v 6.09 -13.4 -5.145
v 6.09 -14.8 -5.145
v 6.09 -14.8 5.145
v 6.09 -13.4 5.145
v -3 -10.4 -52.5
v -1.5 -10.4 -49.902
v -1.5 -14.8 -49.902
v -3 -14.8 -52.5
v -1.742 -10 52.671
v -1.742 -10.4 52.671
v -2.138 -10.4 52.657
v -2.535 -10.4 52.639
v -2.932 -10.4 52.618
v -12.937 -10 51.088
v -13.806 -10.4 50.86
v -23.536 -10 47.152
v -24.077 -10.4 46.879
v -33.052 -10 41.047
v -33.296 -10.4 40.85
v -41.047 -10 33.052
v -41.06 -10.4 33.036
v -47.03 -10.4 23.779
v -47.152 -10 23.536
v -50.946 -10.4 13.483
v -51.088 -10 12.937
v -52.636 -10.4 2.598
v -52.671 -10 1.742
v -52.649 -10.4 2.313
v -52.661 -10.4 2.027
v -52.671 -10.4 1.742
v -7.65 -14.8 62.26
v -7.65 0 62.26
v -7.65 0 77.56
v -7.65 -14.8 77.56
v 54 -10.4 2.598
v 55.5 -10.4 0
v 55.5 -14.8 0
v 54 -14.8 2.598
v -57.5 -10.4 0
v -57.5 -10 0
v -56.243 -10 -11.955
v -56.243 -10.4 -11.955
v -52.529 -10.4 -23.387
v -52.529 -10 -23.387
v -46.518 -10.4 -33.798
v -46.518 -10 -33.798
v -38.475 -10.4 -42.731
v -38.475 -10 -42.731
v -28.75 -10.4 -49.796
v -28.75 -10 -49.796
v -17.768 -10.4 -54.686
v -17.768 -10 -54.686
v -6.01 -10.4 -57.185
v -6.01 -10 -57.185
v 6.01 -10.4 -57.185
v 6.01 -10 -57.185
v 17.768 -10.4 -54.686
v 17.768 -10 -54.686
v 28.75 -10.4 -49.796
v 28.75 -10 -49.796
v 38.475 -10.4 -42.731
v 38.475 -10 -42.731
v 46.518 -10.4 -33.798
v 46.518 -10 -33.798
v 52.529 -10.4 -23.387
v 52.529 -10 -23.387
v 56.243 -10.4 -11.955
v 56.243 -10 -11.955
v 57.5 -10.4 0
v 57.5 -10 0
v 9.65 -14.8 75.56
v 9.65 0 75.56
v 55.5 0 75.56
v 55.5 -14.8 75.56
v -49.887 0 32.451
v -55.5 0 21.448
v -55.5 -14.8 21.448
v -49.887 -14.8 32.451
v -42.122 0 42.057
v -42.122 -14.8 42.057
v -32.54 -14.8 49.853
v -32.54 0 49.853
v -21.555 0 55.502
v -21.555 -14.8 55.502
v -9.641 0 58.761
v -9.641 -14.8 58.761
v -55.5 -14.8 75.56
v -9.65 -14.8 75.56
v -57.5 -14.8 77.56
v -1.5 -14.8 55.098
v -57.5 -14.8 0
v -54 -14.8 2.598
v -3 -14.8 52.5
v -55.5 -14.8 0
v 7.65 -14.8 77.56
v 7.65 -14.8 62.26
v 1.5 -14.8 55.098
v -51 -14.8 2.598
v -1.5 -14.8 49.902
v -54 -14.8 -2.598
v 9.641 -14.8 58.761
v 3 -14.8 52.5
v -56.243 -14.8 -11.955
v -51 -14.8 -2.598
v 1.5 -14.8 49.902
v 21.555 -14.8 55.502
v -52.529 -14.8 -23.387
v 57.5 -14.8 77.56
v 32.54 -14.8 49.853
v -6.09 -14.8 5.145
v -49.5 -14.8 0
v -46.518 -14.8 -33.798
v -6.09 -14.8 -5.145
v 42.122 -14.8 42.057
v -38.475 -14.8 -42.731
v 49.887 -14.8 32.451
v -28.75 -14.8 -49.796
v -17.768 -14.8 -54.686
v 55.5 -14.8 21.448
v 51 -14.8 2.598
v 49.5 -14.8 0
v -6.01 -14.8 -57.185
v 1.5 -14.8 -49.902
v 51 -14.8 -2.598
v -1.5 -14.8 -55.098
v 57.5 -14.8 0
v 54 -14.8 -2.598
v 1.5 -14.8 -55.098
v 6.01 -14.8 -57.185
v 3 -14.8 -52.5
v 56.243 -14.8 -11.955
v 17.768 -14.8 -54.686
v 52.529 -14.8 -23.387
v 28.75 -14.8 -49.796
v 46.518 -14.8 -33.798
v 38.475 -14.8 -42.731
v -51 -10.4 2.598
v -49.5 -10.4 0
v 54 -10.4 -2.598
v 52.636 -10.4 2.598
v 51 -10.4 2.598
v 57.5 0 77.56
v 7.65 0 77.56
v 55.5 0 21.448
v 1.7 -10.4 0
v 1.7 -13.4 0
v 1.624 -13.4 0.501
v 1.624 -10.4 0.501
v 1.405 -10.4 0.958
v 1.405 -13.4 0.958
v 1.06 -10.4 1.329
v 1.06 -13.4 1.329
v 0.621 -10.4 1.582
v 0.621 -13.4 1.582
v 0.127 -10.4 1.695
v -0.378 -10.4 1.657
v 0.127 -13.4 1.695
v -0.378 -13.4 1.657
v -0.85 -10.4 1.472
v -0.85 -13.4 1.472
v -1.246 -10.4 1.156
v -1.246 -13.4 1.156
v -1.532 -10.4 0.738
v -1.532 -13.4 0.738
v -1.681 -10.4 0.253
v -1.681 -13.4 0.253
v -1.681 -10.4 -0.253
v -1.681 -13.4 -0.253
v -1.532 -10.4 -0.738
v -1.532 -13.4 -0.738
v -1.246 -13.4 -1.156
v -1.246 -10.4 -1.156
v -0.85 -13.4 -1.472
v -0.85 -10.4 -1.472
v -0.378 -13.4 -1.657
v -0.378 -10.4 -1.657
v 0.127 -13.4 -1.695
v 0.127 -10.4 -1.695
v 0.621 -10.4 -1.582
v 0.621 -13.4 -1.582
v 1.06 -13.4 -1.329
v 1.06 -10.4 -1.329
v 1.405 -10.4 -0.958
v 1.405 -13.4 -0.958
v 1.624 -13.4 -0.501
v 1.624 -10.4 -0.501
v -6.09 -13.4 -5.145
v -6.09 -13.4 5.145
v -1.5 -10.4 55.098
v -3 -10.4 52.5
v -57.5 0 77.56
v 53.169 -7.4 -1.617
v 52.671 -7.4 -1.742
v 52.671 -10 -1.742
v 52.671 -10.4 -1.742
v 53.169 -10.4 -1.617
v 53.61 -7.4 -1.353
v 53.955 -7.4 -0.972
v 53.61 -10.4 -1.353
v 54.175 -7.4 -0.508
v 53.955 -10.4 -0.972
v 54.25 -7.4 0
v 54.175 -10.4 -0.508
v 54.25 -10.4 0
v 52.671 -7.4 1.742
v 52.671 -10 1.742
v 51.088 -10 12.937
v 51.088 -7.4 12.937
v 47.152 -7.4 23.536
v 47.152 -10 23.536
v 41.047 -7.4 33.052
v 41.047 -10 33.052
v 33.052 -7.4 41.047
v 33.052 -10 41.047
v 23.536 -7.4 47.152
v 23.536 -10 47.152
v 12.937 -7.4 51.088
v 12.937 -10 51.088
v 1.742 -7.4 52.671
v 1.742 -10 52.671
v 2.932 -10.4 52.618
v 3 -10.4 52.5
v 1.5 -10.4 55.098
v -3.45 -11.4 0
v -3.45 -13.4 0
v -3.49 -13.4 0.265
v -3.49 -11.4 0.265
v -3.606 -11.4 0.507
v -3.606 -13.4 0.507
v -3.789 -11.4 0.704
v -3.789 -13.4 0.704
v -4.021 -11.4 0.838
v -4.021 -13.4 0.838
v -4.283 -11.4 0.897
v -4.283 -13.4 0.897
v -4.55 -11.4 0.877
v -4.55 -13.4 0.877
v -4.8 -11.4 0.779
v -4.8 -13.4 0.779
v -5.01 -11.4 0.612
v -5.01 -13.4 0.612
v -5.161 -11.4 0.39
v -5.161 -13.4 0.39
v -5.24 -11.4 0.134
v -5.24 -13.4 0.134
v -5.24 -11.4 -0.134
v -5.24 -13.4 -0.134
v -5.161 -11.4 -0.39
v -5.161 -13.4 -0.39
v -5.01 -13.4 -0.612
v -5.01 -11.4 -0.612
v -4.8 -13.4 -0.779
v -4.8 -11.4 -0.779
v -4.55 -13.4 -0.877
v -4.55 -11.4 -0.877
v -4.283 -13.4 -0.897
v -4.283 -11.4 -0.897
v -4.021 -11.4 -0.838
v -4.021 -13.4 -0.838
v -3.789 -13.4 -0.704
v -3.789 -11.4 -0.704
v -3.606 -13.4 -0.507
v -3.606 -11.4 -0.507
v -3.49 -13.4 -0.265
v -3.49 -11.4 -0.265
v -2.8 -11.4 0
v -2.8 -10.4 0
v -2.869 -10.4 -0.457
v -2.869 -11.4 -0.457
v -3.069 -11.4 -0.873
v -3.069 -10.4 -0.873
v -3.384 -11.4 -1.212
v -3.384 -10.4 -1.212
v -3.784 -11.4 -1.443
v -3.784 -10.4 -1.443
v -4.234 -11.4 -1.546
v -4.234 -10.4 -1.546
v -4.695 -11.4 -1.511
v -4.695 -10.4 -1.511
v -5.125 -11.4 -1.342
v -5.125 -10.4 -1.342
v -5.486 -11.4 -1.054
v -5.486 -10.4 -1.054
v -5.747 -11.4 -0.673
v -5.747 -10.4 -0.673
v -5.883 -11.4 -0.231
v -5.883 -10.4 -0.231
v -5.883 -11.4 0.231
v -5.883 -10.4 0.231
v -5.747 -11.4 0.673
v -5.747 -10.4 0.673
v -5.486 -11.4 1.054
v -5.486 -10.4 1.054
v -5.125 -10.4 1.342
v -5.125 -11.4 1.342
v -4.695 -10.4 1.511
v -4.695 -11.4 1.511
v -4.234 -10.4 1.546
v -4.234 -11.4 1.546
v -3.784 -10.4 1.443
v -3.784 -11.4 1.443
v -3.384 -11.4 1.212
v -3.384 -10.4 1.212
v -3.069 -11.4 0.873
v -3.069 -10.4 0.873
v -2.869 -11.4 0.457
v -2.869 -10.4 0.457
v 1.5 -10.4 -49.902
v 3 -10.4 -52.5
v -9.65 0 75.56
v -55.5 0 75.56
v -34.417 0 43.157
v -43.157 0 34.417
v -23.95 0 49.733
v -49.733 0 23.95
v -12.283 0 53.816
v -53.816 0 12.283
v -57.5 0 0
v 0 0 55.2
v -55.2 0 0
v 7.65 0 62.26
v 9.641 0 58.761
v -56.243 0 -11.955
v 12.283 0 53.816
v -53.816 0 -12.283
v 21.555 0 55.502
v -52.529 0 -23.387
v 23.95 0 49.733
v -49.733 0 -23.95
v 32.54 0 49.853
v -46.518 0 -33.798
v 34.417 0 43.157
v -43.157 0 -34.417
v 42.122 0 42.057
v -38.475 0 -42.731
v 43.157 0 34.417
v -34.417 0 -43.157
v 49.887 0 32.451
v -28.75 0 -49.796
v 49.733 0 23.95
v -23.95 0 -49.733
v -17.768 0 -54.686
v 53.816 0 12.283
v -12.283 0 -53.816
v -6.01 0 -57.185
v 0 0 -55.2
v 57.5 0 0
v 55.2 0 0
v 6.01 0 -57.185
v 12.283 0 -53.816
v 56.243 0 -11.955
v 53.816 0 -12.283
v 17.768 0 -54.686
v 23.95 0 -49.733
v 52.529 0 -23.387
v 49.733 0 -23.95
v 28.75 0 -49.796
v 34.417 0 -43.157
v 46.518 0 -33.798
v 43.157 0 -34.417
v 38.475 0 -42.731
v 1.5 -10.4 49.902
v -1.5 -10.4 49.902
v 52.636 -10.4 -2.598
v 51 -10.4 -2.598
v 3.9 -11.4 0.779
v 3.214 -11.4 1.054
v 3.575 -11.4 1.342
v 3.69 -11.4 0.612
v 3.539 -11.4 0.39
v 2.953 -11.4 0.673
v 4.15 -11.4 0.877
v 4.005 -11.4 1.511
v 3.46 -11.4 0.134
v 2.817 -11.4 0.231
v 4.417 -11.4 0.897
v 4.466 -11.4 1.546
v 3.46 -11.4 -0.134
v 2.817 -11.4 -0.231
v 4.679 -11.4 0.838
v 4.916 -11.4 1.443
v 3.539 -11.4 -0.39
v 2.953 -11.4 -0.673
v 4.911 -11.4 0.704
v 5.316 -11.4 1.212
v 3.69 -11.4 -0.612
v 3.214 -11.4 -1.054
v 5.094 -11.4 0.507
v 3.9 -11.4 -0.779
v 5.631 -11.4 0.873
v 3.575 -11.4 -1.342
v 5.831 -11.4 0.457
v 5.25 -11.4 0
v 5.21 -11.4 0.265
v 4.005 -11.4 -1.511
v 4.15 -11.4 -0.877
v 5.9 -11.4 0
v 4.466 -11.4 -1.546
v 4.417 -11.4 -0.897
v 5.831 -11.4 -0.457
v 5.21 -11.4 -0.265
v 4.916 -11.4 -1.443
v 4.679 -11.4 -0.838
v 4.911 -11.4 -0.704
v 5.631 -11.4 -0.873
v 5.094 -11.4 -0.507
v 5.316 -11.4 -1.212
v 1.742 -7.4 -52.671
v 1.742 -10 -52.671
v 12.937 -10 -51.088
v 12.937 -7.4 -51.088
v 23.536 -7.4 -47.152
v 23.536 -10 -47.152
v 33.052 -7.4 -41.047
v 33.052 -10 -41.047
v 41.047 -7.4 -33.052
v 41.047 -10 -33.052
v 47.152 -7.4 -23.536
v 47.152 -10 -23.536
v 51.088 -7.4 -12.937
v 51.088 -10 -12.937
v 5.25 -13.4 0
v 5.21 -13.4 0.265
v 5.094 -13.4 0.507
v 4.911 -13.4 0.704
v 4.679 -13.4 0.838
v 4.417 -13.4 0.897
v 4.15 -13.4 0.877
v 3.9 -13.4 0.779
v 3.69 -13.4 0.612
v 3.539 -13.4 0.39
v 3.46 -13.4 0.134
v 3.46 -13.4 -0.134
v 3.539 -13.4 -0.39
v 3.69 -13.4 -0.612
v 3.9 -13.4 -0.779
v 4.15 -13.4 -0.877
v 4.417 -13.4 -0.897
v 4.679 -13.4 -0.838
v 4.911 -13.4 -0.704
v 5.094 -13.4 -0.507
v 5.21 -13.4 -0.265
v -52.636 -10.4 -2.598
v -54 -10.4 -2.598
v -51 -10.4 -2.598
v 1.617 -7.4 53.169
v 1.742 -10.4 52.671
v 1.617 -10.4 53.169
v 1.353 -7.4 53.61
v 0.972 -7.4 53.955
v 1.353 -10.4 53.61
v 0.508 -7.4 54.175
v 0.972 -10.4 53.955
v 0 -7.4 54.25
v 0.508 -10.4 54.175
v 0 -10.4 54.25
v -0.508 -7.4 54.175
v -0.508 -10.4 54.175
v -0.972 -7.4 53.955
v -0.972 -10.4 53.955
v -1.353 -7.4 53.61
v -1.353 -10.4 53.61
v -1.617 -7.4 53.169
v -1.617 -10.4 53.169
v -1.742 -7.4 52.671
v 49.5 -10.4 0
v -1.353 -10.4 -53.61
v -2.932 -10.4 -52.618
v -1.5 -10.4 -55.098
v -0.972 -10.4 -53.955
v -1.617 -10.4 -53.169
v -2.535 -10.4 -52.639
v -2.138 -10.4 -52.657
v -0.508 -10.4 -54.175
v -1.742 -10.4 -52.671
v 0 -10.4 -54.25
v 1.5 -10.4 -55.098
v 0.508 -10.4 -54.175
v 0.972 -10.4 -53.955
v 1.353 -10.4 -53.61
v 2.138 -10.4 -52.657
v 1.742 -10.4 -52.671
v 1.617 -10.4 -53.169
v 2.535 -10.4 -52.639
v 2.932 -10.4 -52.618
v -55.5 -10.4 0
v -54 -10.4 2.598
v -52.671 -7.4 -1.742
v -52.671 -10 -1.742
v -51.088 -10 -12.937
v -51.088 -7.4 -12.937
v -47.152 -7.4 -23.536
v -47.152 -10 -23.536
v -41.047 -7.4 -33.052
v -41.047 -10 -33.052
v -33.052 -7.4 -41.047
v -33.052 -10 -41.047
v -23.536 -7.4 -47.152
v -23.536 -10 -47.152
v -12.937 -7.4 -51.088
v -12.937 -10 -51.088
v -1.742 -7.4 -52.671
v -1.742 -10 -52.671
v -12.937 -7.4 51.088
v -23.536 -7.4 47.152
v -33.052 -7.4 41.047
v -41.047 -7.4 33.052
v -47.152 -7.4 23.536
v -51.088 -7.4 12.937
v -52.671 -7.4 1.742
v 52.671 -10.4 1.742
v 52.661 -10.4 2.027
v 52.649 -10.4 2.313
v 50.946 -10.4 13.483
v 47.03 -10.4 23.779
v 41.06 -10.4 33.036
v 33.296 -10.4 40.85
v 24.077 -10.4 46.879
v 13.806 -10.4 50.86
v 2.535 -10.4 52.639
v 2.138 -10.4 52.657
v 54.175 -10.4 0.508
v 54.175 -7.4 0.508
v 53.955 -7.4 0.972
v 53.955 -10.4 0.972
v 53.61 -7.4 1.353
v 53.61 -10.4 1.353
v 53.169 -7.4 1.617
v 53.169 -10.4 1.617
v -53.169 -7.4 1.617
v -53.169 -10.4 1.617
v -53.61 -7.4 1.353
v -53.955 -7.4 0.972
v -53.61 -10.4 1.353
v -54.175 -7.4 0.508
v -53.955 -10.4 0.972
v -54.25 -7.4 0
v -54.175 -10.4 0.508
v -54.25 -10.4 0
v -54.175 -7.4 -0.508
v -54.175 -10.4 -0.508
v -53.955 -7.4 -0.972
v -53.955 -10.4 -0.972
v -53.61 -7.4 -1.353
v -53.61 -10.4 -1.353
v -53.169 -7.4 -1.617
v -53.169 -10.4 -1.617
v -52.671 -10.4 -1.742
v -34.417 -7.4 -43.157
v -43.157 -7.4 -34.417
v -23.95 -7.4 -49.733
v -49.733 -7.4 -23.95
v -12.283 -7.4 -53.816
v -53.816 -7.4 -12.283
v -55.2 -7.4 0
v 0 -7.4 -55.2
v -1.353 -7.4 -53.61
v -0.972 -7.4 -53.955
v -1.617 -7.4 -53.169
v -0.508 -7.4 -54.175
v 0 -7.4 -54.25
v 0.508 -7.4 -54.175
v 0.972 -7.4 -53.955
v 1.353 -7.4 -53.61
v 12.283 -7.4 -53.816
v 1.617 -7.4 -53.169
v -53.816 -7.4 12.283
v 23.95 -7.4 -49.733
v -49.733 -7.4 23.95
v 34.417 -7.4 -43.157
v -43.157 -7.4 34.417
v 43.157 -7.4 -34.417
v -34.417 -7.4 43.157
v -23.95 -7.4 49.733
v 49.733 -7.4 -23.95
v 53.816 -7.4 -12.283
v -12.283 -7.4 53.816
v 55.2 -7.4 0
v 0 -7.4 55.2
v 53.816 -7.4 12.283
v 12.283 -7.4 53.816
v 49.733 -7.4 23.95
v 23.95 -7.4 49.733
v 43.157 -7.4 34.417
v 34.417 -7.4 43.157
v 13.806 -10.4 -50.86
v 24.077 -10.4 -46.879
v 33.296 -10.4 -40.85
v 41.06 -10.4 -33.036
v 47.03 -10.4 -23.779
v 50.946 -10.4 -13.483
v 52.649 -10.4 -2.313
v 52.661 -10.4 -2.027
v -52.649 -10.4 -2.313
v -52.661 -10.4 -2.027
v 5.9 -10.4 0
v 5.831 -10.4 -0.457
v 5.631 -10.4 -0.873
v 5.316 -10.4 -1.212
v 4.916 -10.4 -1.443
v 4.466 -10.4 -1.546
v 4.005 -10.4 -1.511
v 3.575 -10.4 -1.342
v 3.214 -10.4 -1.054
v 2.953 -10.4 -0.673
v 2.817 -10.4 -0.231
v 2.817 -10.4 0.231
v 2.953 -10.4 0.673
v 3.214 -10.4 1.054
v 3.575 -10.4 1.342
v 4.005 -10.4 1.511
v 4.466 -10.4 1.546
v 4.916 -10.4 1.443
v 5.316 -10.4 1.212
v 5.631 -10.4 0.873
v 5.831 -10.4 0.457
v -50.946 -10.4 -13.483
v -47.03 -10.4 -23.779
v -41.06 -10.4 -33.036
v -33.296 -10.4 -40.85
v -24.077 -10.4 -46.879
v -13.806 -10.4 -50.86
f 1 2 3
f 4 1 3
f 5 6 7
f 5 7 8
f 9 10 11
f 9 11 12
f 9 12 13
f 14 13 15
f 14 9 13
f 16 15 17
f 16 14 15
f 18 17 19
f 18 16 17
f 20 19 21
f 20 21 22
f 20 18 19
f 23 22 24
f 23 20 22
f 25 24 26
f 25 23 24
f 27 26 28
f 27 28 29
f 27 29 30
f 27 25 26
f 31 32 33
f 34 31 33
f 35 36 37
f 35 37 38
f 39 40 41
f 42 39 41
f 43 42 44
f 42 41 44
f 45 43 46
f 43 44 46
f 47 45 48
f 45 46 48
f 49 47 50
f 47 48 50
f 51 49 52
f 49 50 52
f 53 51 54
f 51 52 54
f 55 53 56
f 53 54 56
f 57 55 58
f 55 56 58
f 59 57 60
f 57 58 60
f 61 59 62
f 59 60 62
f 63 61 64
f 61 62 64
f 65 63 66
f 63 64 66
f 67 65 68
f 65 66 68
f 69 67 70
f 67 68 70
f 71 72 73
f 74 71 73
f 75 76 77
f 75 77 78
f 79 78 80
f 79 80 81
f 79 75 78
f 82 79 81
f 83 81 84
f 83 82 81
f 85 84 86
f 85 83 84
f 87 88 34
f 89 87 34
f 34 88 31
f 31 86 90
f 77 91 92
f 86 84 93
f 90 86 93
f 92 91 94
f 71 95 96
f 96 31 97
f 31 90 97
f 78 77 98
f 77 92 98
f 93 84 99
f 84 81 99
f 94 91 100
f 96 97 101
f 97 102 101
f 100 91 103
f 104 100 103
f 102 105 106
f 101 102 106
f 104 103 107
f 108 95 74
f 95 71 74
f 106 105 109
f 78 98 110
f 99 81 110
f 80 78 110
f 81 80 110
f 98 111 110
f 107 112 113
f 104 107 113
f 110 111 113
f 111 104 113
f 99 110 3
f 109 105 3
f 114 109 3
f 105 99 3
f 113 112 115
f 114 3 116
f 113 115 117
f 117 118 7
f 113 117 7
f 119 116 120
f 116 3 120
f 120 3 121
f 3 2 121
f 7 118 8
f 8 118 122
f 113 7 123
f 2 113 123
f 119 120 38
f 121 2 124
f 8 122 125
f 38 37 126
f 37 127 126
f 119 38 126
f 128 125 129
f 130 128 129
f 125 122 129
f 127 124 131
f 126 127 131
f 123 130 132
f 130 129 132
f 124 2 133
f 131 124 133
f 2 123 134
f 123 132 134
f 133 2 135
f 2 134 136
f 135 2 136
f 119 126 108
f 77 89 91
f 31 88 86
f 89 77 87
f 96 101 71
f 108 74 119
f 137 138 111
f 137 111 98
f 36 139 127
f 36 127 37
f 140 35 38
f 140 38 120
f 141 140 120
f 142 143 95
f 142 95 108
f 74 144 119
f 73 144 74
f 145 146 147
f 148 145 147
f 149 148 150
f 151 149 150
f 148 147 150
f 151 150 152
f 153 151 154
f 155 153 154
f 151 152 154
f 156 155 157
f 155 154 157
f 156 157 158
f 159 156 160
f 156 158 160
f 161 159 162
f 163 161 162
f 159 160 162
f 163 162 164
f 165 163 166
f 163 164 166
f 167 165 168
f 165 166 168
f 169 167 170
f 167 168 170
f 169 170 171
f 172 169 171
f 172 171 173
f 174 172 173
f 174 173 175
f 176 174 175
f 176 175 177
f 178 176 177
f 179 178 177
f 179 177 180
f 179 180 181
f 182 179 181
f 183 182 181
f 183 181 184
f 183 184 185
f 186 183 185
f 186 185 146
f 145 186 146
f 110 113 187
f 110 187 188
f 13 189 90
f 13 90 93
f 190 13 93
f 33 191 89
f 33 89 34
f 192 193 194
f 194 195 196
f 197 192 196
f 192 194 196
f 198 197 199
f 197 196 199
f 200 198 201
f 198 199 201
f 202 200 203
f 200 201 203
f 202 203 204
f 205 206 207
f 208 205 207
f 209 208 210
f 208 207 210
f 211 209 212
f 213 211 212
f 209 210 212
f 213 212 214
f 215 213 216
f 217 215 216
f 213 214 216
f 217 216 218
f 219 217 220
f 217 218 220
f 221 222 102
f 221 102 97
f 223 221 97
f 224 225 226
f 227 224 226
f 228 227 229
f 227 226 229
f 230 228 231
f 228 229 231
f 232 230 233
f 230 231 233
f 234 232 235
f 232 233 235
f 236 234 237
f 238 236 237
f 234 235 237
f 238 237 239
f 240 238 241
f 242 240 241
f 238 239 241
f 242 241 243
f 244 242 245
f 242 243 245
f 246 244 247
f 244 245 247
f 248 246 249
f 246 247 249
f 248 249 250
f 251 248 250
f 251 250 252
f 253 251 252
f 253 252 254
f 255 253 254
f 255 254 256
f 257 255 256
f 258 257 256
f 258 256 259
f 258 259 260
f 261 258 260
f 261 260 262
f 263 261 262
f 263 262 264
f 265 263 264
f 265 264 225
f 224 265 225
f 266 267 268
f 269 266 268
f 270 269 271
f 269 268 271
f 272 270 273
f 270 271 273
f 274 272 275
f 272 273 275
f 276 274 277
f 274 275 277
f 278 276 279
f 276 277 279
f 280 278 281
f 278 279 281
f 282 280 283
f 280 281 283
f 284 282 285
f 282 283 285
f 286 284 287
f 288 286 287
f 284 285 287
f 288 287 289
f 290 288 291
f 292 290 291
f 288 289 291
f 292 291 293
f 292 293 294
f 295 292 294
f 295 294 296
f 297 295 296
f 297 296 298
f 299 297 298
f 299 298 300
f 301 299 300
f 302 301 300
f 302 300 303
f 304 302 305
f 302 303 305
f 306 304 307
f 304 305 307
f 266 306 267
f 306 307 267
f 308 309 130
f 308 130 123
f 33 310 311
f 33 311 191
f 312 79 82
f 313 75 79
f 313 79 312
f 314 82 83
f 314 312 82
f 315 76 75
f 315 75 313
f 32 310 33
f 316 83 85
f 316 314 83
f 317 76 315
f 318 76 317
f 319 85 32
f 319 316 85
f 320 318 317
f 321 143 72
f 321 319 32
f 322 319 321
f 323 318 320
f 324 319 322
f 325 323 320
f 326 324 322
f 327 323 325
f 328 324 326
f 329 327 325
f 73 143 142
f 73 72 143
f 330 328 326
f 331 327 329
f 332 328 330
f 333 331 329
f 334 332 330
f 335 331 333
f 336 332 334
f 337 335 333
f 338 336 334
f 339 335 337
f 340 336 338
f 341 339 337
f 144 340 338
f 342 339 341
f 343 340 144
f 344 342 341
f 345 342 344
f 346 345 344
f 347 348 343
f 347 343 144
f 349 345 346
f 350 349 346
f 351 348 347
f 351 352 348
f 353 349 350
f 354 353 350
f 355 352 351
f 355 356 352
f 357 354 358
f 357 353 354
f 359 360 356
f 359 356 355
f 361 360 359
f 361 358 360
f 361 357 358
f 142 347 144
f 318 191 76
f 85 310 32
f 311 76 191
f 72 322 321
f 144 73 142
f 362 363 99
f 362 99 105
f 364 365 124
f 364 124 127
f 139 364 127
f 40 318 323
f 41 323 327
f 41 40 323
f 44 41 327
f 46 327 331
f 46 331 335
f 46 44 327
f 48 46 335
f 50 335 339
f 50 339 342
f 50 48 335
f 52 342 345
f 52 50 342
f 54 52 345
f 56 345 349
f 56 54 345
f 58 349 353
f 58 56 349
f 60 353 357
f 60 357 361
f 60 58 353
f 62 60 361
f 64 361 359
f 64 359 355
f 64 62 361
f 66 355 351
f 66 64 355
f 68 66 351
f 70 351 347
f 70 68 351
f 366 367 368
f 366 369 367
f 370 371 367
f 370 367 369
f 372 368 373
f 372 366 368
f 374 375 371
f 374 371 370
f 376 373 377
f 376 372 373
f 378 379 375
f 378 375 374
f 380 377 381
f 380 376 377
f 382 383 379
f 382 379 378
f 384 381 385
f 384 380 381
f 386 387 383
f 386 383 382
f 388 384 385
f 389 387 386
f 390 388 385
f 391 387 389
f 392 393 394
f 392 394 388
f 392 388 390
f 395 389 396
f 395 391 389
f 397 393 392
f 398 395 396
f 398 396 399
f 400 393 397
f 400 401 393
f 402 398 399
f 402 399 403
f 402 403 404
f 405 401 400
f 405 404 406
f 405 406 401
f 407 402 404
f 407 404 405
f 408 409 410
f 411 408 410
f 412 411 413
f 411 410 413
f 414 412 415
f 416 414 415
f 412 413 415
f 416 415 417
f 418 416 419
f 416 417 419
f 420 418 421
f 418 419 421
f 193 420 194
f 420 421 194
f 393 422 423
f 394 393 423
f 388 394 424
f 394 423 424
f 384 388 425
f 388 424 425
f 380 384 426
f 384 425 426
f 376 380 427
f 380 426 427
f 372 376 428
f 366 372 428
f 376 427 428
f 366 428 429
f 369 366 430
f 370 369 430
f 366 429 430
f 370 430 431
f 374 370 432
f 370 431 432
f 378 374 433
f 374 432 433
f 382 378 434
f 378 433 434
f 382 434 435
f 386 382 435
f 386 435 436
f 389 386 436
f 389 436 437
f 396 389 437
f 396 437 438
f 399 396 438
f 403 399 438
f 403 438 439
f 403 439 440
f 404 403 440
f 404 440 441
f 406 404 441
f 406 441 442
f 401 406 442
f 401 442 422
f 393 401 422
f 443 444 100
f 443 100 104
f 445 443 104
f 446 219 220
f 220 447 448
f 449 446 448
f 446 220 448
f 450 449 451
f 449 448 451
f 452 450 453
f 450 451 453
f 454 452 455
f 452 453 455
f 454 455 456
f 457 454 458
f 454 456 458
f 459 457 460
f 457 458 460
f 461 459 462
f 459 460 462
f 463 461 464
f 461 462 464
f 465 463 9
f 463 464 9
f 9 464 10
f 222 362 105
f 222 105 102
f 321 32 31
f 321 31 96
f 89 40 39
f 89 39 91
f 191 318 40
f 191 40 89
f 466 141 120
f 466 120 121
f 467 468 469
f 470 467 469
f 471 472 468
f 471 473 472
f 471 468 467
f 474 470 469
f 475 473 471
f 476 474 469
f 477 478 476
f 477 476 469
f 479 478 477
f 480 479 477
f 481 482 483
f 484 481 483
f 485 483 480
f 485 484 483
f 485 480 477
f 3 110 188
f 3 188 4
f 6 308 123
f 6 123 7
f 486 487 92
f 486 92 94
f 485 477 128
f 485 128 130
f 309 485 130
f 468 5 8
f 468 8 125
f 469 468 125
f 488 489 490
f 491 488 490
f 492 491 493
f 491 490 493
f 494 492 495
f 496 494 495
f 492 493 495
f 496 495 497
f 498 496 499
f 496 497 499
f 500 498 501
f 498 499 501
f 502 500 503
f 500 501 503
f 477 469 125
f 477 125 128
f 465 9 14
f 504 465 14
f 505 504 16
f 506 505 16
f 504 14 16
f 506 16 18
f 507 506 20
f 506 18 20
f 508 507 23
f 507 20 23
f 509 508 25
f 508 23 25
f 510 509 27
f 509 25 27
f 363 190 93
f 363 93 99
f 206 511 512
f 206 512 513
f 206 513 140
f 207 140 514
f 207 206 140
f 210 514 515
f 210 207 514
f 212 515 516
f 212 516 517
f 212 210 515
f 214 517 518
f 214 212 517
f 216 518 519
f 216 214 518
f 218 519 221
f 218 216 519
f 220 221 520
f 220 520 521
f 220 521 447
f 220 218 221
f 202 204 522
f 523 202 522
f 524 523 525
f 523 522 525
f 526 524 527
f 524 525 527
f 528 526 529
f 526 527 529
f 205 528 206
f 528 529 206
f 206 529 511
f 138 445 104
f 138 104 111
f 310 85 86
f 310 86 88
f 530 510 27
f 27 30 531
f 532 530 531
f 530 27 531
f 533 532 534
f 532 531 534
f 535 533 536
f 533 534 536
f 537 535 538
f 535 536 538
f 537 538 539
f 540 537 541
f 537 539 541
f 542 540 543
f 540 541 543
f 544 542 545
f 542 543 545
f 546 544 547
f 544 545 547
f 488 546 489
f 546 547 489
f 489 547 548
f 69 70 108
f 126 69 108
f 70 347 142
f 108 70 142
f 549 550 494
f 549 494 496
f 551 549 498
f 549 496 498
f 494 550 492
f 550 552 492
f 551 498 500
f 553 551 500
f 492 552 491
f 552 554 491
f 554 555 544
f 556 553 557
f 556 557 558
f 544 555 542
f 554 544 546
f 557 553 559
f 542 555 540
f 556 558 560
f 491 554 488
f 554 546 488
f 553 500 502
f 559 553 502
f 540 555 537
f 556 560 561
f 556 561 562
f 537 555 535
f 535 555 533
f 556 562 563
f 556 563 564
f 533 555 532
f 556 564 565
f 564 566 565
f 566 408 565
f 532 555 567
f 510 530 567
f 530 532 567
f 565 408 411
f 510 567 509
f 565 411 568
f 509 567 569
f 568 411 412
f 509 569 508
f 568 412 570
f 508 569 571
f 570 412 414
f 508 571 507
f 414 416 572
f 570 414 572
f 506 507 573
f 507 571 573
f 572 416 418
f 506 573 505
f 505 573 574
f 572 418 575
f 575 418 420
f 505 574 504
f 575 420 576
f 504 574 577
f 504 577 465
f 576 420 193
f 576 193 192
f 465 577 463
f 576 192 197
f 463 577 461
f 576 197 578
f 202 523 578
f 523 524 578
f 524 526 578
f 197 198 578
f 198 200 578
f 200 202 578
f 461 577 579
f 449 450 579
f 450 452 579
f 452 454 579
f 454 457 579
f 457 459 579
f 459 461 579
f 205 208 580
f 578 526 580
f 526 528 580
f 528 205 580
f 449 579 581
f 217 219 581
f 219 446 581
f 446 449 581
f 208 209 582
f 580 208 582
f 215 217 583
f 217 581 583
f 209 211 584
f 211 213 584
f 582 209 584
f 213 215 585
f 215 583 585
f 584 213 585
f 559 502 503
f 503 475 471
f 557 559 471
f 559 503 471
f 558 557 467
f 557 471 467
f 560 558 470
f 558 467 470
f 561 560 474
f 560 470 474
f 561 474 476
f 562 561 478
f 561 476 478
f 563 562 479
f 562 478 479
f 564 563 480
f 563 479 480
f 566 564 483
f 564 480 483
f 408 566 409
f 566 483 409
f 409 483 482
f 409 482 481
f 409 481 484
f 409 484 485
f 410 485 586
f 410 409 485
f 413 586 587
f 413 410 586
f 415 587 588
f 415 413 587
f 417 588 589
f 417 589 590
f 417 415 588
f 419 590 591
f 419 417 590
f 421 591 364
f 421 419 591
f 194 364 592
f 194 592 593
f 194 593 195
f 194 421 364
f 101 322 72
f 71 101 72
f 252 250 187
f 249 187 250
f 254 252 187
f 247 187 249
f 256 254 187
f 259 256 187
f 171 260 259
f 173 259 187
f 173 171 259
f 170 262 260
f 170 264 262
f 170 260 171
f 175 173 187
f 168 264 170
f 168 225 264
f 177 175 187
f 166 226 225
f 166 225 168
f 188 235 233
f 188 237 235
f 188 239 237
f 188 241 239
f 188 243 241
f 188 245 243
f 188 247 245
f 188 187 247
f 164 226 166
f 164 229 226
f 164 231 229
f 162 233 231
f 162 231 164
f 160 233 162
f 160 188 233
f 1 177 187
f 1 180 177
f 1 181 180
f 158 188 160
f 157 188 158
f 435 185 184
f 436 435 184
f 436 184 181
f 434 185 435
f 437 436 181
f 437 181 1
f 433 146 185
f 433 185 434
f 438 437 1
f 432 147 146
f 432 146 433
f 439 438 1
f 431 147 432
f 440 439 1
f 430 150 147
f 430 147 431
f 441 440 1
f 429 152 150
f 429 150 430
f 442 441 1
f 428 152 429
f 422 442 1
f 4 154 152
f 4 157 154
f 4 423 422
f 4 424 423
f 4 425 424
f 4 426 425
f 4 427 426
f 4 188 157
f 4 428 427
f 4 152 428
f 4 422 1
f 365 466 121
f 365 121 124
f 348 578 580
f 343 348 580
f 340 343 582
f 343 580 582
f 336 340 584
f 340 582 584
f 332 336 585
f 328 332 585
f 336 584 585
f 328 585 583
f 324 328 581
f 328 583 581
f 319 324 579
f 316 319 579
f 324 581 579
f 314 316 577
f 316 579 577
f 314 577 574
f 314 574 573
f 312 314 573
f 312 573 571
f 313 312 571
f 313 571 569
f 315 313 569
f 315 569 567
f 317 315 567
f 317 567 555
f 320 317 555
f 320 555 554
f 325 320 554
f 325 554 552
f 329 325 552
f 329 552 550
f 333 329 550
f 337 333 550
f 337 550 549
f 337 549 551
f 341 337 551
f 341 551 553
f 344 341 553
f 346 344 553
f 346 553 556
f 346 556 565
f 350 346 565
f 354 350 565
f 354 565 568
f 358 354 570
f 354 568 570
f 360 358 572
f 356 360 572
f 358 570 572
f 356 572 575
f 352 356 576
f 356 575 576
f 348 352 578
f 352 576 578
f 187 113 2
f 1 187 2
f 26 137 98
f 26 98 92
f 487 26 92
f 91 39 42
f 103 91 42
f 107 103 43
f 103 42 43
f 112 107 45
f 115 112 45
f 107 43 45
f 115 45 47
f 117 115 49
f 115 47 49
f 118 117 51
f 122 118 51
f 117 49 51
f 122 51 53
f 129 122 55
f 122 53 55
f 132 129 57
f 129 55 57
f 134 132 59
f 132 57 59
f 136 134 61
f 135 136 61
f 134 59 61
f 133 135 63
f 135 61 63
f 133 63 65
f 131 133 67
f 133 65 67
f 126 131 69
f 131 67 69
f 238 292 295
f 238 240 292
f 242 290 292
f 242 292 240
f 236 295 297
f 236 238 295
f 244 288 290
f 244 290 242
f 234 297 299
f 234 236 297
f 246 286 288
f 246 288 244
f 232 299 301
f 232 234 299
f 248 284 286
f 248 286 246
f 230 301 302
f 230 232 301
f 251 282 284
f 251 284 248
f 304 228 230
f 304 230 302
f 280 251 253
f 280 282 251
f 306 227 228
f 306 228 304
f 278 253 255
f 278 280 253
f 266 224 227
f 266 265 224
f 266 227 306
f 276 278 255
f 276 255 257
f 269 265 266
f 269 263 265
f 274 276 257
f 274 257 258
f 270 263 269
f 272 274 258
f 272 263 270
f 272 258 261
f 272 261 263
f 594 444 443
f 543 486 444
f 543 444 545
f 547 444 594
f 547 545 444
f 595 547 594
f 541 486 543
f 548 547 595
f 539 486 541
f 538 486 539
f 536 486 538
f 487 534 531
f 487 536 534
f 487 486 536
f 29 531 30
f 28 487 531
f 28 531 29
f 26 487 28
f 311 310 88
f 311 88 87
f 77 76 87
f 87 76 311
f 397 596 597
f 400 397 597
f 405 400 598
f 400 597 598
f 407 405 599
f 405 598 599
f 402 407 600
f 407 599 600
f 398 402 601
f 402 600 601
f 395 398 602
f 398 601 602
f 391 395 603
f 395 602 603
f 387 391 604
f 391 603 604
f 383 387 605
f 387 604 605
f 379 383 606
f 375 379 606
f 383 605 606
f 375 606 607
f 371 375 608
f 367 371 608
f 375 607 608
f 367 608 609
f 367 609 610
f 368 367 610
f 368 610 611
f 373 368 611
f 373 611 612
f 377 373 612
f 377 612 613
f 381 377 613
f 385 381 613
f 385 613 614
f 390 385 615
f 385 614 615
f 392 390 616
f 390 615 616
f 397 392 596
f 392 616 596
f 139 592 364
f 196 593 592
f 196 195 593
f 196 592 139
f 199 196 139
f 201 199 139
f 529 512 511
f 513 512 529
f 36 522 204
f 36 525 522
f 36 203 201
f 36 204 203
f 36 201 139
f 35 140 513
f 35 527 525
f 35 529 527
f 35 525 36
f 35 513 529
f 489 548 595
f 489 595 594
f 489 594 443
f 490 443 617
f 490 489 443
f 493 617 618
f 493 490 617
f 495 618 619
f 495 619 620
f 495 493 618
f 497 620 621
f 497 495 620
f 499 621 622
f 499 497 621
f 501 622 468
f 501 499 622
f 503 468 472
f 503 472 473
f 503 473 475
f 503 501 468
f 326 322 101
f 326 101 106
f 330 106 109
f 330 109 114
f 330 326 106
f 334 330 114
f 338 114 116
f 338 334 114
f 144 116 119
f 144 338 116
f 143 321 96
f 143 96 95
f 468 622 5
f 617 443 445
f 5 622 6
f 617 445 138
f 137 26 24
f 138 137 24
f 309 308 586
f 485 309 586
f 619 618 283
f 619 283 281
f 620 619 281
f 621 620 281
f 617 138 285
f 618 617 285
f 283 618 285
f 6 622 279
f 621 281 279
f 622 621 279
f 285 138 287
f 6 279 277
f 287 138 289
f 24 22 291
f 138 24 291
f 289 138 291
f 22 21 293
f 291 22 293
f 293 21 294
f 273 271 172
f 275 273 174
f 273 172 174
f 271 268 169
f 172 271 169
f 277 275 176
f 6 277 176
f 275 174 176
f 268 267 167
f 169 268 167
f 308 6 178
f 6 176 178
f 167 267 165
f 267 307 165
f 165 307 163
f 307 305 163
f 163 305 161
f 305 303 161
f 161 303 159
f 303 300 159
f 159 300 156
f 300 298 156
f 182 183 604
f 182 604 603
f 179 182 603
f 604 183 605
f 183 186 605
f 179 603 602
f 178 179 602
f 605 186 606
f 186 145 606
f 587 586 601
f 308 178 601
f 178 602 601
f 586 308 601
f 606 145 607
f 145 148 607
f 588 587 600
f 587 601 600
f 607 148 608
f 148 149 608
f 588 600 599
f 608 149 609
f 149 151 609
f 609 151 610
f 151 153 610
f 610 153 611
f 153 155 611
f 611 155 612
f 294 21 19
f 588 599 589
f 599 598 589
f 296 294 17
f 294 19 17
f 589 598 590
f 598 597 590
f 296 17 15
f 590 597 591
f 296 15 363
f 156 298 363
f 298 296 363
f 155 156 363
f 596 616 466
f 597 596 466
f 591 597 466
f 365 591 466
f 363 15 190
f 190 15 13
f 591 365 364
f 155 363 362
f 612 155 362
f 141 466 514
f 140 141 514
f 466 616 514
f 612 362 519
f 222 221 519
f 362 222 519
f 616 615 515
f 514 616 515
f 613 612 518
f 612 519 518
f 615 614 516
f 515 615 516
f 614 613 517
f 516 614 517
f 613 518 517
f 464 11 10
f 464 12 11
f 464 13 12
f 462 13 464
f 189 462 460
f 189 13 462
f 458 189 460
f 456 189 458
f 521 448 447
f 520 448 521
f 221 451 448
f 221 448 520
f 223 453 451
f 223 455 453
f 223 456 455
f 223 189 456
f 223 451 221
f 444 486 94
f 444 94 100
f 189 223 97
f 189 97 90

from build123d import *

# Parameters (mm, degrees)
SKETCH073_R     = 57.5
SKETCH073_R_2   = 50.2
PAD023_DEPTH    = 10
SKETCH074_R     = 57.5
SKETCH074_R_2   = 52.7
PAD024_DEPTH    = 10
SKETCH075_R     = 55.2
SKETCH075_R_2   = 45.630592
POCKET038_DEPTH = 10.001
SKETCH076_R     = 55.2
SKETCH076_R_2   = 52.7
PAD025_DEPTH    = 2.6
SKETCH077_R     = 57.5
SKETCH077_R_2   = 52.7
PAD026_DEPTH    = 0.4
SKETCH078_R     = 1.75
POCKET039_DEPTH = 5
SKETCH079_R     = 57.5
PAD027_DEPTH    = 4.4
SKETCH080_W     = 12.18
SKETCH080_H     = 10.29
POCKET040_DEPTH = 1.4
SKETCH081_R     = 1.7
POCKET041_DEPTH = 14.801
SKETCH082_R     = 0.9
POCKET042_DEPTH = 14.801
SKETCH083_R     = 1.55
POCKET043_DEPTH = 1
PAD028_DEPTH    = 14.8


with BuildPart() as part:
    # Sketch073 (on DatumPlane) → Pad023 (new body)
    with BuildSketch(Plane.XZ.offset(10)):
        Circle(SKETCH073_R)
        Circle(SKETCH073_R_2, mode=Mode.SUBTRACT)
    extrude(amount=-PAD023_DEPTH)

    # Sketch074 (on DatumPlane) → Pad024 (new body)
    with BuildSketch(Plane.XZ.offset(10)):
        Circle(SKETCH074_R)
        Circle(SKETCH074_R_2, mode=Mode.SUBTRACT)
    extrude(amount=-PAD024_DEPTH)

    # Sketch075 (on Face4 of PolarPattern008) → Pocket038 (cut, through all)
    with BuildSketch(Plane.XZ.offset(10)):
        Circle(SKETCH075_R)
        Circle(SKETCH075_R_2, mode=Mode.SUBTRACT)
    extrude(amount=-POCKET038_DEPTH, mode=Mode.SUBTRACT)

    # Sketch076 (on Face2 of Pocket038) → Pad025 (new body)
    with BuildSketch(Plane.XZ.offset(10)):
        Circle(SKETCH076_R)
        Circle(SKETCH076_R_2, mode=Mode.SUBTRACT)
    extrude(amount=-PAD025_DEPTH)

    # Sketch077 (on Face6 of Pad025) → Pad026 (new body)
    with BuildSketch(Plane.XZ.offset(10)):
        Circle(SKETCH077_R)
        Circle(SKETCH077_R_2, mode=Mode.SUBTRACT)
    extrude(amount=PAD026_DEPTH)

    # Sketch078 (on Face5 of Pad026) → Pocket039 (cut)
    with BuildSketch(Plane.XZ.offset(10.4)):
        with Locations((0, -52.5)):
            Circle(SKETCH078_R)
        with Locations((-52.5, 0)):
            Circle(SKETCH078_R)
        with Locations((0, 52.5)):
            Circle(SKETCH078_R)
        with Locations((52.5, 0)):
            Circle(SKETCH078_R)
    extrude(amount=-POCKET039_DEPTH, mode=Mode.SUBTRACT)

    # Sketch079 (on Face4 of Pocket039) → Pad027 (new body)
    with BuildSketch(Plane.XZ.offset(10.4)):
        Circle(SKETCH079_R)
        Polygon((3, -52.5), (1.5, -49.901924), (-1.5, -49.901924), (-3, -52.5), (-1.5, -55.098076), (1.5, -55.098076), align=None, mode=Mode.SUBTRACT)
        Polygon((3, 52.5), (1.5, 55.098076), (-1.5, 55.098076), (-3, 52.5), (-1.5, 49.901924), (1.5, 49.901924), align=None, mode=Mode.SUBTRACT)
        Polygon((-49.5, 0), (-51, 2.598076), (-54, 2.598076), (-55.5, 0), (-54, -2.598076), (-51, -2.598076), align=None, mode=Mode.SUBTRACT)
        Polygon((55.5, 0), (54, 2.598076), (51, 2.598076), (49.5, 0), (51, -2.598076), (54, -2.598076), align=None, mode=Mode.SUBTRACT)
    extrude(amount=PAD027_DEPTH)

    # Sketch080 (on Face13 of Pad027) → Pocket040 (cut)
    with BuildSketch(Plane.XZ.offset(14.8)):
        Rectangle(SKETCH080_W, SKETCH080_H)
    extrude(amount=-POCKET040_DEPTH, mode=Mode.SUBTRACT)

    # Sketch081 (on Face4 of Pocket040) → Pocket041 (cut, through all)
    with BuildSketch(Plane.XZ.offset(14.8)):
        Circle(SKETCH081_R)
    extrude(amount=-POCKET041_DEPTH, mode=Mode.SUBTRACT)

    # Sketch082 (on Face4 of Pocket041) → Pocket042 (cut, through all)
    with BuildSketch(Plane.XZ.offset(14.8)):
        with Locations((-4.35, 0)):
            Circle(SKETCH082_R)
        with Locations((4.35, 0)):
            Circle(SKETCH082_R)
    extrude(amount=-POCKET042_DEPTH, mode=Mode.SUBTRACT)

    # Sketch083 (on Face42 of Pocket042) → Pocket043 (cut)
    with BuildSketch(Plane(origin=(0, -10.4, 0), x_dir=(1, 0, 0), z_dir=(0, 1, 0))):
        with Locations((-4.35, 0)):
            Circle(SKETCH083_R)
        with Locations((4.35, 0)):
            Circle(SKETCH083_R)
    extrude(amount=-POCKET043_DEPTH, mode=Mode.SUBTRACT)

    # Sketch084 (on Face1 of Pocket043) → Pad028 (new body)
    with BuildSketch(Plane(origin=(0, 0, 0), x_dir=(1, 0, 0), z_dir=(0, 1, 0))):
        with BuildLine():
            Line((-7.65, -62.26), (7.65, -62.26))
            Line((7.65, -62.26), (7.65, -77.56))
            Line((7.65, -77.56), (57.5, -77.56))
            Line((57.5, 0), (57.5, -77.56))
            ThreePointArc((-57.5, 0), (0, -57.5), (57.5, 0))
            Line((-57.5, 0), (-57.5, -77.56))
            Line((-57.5, -77.56), (-7.65, -77.56))
            Line((-7.65, -62.26), (-7.65, -77.56))
        make_face()
        with BuildLine():
            Line((9.640661, -58.760865), (9.65, -75.56))
            Line((9.65, -75.56), (55.5, -75.56))
            Line((55.500076, -21.447651), (55.5, -75.56))
            ThreePointArc((9.640661, -58.760865), (37.533805, -46.204517), (55.500076, -21.447651))
        make_face(mode=Mode.SUBTRACT)
        with BuildLine():
            Line((-9.65, -75.56), (-55.5, -75.56))
            Line((-55.500076, -21.447651), (-55.5, -75.56))
            ThreePointArc((-55.500076, -21.447651), (-37.533805, -46.204517), (-9.640661, -58.760865))
            Line((-9.640661, -58.760865), (-9.65, -75.56))
        make_face(mode=Mode.SUBTRACT)
    extrude(amount=-PAD028_DEPTH)


solid = part.part
